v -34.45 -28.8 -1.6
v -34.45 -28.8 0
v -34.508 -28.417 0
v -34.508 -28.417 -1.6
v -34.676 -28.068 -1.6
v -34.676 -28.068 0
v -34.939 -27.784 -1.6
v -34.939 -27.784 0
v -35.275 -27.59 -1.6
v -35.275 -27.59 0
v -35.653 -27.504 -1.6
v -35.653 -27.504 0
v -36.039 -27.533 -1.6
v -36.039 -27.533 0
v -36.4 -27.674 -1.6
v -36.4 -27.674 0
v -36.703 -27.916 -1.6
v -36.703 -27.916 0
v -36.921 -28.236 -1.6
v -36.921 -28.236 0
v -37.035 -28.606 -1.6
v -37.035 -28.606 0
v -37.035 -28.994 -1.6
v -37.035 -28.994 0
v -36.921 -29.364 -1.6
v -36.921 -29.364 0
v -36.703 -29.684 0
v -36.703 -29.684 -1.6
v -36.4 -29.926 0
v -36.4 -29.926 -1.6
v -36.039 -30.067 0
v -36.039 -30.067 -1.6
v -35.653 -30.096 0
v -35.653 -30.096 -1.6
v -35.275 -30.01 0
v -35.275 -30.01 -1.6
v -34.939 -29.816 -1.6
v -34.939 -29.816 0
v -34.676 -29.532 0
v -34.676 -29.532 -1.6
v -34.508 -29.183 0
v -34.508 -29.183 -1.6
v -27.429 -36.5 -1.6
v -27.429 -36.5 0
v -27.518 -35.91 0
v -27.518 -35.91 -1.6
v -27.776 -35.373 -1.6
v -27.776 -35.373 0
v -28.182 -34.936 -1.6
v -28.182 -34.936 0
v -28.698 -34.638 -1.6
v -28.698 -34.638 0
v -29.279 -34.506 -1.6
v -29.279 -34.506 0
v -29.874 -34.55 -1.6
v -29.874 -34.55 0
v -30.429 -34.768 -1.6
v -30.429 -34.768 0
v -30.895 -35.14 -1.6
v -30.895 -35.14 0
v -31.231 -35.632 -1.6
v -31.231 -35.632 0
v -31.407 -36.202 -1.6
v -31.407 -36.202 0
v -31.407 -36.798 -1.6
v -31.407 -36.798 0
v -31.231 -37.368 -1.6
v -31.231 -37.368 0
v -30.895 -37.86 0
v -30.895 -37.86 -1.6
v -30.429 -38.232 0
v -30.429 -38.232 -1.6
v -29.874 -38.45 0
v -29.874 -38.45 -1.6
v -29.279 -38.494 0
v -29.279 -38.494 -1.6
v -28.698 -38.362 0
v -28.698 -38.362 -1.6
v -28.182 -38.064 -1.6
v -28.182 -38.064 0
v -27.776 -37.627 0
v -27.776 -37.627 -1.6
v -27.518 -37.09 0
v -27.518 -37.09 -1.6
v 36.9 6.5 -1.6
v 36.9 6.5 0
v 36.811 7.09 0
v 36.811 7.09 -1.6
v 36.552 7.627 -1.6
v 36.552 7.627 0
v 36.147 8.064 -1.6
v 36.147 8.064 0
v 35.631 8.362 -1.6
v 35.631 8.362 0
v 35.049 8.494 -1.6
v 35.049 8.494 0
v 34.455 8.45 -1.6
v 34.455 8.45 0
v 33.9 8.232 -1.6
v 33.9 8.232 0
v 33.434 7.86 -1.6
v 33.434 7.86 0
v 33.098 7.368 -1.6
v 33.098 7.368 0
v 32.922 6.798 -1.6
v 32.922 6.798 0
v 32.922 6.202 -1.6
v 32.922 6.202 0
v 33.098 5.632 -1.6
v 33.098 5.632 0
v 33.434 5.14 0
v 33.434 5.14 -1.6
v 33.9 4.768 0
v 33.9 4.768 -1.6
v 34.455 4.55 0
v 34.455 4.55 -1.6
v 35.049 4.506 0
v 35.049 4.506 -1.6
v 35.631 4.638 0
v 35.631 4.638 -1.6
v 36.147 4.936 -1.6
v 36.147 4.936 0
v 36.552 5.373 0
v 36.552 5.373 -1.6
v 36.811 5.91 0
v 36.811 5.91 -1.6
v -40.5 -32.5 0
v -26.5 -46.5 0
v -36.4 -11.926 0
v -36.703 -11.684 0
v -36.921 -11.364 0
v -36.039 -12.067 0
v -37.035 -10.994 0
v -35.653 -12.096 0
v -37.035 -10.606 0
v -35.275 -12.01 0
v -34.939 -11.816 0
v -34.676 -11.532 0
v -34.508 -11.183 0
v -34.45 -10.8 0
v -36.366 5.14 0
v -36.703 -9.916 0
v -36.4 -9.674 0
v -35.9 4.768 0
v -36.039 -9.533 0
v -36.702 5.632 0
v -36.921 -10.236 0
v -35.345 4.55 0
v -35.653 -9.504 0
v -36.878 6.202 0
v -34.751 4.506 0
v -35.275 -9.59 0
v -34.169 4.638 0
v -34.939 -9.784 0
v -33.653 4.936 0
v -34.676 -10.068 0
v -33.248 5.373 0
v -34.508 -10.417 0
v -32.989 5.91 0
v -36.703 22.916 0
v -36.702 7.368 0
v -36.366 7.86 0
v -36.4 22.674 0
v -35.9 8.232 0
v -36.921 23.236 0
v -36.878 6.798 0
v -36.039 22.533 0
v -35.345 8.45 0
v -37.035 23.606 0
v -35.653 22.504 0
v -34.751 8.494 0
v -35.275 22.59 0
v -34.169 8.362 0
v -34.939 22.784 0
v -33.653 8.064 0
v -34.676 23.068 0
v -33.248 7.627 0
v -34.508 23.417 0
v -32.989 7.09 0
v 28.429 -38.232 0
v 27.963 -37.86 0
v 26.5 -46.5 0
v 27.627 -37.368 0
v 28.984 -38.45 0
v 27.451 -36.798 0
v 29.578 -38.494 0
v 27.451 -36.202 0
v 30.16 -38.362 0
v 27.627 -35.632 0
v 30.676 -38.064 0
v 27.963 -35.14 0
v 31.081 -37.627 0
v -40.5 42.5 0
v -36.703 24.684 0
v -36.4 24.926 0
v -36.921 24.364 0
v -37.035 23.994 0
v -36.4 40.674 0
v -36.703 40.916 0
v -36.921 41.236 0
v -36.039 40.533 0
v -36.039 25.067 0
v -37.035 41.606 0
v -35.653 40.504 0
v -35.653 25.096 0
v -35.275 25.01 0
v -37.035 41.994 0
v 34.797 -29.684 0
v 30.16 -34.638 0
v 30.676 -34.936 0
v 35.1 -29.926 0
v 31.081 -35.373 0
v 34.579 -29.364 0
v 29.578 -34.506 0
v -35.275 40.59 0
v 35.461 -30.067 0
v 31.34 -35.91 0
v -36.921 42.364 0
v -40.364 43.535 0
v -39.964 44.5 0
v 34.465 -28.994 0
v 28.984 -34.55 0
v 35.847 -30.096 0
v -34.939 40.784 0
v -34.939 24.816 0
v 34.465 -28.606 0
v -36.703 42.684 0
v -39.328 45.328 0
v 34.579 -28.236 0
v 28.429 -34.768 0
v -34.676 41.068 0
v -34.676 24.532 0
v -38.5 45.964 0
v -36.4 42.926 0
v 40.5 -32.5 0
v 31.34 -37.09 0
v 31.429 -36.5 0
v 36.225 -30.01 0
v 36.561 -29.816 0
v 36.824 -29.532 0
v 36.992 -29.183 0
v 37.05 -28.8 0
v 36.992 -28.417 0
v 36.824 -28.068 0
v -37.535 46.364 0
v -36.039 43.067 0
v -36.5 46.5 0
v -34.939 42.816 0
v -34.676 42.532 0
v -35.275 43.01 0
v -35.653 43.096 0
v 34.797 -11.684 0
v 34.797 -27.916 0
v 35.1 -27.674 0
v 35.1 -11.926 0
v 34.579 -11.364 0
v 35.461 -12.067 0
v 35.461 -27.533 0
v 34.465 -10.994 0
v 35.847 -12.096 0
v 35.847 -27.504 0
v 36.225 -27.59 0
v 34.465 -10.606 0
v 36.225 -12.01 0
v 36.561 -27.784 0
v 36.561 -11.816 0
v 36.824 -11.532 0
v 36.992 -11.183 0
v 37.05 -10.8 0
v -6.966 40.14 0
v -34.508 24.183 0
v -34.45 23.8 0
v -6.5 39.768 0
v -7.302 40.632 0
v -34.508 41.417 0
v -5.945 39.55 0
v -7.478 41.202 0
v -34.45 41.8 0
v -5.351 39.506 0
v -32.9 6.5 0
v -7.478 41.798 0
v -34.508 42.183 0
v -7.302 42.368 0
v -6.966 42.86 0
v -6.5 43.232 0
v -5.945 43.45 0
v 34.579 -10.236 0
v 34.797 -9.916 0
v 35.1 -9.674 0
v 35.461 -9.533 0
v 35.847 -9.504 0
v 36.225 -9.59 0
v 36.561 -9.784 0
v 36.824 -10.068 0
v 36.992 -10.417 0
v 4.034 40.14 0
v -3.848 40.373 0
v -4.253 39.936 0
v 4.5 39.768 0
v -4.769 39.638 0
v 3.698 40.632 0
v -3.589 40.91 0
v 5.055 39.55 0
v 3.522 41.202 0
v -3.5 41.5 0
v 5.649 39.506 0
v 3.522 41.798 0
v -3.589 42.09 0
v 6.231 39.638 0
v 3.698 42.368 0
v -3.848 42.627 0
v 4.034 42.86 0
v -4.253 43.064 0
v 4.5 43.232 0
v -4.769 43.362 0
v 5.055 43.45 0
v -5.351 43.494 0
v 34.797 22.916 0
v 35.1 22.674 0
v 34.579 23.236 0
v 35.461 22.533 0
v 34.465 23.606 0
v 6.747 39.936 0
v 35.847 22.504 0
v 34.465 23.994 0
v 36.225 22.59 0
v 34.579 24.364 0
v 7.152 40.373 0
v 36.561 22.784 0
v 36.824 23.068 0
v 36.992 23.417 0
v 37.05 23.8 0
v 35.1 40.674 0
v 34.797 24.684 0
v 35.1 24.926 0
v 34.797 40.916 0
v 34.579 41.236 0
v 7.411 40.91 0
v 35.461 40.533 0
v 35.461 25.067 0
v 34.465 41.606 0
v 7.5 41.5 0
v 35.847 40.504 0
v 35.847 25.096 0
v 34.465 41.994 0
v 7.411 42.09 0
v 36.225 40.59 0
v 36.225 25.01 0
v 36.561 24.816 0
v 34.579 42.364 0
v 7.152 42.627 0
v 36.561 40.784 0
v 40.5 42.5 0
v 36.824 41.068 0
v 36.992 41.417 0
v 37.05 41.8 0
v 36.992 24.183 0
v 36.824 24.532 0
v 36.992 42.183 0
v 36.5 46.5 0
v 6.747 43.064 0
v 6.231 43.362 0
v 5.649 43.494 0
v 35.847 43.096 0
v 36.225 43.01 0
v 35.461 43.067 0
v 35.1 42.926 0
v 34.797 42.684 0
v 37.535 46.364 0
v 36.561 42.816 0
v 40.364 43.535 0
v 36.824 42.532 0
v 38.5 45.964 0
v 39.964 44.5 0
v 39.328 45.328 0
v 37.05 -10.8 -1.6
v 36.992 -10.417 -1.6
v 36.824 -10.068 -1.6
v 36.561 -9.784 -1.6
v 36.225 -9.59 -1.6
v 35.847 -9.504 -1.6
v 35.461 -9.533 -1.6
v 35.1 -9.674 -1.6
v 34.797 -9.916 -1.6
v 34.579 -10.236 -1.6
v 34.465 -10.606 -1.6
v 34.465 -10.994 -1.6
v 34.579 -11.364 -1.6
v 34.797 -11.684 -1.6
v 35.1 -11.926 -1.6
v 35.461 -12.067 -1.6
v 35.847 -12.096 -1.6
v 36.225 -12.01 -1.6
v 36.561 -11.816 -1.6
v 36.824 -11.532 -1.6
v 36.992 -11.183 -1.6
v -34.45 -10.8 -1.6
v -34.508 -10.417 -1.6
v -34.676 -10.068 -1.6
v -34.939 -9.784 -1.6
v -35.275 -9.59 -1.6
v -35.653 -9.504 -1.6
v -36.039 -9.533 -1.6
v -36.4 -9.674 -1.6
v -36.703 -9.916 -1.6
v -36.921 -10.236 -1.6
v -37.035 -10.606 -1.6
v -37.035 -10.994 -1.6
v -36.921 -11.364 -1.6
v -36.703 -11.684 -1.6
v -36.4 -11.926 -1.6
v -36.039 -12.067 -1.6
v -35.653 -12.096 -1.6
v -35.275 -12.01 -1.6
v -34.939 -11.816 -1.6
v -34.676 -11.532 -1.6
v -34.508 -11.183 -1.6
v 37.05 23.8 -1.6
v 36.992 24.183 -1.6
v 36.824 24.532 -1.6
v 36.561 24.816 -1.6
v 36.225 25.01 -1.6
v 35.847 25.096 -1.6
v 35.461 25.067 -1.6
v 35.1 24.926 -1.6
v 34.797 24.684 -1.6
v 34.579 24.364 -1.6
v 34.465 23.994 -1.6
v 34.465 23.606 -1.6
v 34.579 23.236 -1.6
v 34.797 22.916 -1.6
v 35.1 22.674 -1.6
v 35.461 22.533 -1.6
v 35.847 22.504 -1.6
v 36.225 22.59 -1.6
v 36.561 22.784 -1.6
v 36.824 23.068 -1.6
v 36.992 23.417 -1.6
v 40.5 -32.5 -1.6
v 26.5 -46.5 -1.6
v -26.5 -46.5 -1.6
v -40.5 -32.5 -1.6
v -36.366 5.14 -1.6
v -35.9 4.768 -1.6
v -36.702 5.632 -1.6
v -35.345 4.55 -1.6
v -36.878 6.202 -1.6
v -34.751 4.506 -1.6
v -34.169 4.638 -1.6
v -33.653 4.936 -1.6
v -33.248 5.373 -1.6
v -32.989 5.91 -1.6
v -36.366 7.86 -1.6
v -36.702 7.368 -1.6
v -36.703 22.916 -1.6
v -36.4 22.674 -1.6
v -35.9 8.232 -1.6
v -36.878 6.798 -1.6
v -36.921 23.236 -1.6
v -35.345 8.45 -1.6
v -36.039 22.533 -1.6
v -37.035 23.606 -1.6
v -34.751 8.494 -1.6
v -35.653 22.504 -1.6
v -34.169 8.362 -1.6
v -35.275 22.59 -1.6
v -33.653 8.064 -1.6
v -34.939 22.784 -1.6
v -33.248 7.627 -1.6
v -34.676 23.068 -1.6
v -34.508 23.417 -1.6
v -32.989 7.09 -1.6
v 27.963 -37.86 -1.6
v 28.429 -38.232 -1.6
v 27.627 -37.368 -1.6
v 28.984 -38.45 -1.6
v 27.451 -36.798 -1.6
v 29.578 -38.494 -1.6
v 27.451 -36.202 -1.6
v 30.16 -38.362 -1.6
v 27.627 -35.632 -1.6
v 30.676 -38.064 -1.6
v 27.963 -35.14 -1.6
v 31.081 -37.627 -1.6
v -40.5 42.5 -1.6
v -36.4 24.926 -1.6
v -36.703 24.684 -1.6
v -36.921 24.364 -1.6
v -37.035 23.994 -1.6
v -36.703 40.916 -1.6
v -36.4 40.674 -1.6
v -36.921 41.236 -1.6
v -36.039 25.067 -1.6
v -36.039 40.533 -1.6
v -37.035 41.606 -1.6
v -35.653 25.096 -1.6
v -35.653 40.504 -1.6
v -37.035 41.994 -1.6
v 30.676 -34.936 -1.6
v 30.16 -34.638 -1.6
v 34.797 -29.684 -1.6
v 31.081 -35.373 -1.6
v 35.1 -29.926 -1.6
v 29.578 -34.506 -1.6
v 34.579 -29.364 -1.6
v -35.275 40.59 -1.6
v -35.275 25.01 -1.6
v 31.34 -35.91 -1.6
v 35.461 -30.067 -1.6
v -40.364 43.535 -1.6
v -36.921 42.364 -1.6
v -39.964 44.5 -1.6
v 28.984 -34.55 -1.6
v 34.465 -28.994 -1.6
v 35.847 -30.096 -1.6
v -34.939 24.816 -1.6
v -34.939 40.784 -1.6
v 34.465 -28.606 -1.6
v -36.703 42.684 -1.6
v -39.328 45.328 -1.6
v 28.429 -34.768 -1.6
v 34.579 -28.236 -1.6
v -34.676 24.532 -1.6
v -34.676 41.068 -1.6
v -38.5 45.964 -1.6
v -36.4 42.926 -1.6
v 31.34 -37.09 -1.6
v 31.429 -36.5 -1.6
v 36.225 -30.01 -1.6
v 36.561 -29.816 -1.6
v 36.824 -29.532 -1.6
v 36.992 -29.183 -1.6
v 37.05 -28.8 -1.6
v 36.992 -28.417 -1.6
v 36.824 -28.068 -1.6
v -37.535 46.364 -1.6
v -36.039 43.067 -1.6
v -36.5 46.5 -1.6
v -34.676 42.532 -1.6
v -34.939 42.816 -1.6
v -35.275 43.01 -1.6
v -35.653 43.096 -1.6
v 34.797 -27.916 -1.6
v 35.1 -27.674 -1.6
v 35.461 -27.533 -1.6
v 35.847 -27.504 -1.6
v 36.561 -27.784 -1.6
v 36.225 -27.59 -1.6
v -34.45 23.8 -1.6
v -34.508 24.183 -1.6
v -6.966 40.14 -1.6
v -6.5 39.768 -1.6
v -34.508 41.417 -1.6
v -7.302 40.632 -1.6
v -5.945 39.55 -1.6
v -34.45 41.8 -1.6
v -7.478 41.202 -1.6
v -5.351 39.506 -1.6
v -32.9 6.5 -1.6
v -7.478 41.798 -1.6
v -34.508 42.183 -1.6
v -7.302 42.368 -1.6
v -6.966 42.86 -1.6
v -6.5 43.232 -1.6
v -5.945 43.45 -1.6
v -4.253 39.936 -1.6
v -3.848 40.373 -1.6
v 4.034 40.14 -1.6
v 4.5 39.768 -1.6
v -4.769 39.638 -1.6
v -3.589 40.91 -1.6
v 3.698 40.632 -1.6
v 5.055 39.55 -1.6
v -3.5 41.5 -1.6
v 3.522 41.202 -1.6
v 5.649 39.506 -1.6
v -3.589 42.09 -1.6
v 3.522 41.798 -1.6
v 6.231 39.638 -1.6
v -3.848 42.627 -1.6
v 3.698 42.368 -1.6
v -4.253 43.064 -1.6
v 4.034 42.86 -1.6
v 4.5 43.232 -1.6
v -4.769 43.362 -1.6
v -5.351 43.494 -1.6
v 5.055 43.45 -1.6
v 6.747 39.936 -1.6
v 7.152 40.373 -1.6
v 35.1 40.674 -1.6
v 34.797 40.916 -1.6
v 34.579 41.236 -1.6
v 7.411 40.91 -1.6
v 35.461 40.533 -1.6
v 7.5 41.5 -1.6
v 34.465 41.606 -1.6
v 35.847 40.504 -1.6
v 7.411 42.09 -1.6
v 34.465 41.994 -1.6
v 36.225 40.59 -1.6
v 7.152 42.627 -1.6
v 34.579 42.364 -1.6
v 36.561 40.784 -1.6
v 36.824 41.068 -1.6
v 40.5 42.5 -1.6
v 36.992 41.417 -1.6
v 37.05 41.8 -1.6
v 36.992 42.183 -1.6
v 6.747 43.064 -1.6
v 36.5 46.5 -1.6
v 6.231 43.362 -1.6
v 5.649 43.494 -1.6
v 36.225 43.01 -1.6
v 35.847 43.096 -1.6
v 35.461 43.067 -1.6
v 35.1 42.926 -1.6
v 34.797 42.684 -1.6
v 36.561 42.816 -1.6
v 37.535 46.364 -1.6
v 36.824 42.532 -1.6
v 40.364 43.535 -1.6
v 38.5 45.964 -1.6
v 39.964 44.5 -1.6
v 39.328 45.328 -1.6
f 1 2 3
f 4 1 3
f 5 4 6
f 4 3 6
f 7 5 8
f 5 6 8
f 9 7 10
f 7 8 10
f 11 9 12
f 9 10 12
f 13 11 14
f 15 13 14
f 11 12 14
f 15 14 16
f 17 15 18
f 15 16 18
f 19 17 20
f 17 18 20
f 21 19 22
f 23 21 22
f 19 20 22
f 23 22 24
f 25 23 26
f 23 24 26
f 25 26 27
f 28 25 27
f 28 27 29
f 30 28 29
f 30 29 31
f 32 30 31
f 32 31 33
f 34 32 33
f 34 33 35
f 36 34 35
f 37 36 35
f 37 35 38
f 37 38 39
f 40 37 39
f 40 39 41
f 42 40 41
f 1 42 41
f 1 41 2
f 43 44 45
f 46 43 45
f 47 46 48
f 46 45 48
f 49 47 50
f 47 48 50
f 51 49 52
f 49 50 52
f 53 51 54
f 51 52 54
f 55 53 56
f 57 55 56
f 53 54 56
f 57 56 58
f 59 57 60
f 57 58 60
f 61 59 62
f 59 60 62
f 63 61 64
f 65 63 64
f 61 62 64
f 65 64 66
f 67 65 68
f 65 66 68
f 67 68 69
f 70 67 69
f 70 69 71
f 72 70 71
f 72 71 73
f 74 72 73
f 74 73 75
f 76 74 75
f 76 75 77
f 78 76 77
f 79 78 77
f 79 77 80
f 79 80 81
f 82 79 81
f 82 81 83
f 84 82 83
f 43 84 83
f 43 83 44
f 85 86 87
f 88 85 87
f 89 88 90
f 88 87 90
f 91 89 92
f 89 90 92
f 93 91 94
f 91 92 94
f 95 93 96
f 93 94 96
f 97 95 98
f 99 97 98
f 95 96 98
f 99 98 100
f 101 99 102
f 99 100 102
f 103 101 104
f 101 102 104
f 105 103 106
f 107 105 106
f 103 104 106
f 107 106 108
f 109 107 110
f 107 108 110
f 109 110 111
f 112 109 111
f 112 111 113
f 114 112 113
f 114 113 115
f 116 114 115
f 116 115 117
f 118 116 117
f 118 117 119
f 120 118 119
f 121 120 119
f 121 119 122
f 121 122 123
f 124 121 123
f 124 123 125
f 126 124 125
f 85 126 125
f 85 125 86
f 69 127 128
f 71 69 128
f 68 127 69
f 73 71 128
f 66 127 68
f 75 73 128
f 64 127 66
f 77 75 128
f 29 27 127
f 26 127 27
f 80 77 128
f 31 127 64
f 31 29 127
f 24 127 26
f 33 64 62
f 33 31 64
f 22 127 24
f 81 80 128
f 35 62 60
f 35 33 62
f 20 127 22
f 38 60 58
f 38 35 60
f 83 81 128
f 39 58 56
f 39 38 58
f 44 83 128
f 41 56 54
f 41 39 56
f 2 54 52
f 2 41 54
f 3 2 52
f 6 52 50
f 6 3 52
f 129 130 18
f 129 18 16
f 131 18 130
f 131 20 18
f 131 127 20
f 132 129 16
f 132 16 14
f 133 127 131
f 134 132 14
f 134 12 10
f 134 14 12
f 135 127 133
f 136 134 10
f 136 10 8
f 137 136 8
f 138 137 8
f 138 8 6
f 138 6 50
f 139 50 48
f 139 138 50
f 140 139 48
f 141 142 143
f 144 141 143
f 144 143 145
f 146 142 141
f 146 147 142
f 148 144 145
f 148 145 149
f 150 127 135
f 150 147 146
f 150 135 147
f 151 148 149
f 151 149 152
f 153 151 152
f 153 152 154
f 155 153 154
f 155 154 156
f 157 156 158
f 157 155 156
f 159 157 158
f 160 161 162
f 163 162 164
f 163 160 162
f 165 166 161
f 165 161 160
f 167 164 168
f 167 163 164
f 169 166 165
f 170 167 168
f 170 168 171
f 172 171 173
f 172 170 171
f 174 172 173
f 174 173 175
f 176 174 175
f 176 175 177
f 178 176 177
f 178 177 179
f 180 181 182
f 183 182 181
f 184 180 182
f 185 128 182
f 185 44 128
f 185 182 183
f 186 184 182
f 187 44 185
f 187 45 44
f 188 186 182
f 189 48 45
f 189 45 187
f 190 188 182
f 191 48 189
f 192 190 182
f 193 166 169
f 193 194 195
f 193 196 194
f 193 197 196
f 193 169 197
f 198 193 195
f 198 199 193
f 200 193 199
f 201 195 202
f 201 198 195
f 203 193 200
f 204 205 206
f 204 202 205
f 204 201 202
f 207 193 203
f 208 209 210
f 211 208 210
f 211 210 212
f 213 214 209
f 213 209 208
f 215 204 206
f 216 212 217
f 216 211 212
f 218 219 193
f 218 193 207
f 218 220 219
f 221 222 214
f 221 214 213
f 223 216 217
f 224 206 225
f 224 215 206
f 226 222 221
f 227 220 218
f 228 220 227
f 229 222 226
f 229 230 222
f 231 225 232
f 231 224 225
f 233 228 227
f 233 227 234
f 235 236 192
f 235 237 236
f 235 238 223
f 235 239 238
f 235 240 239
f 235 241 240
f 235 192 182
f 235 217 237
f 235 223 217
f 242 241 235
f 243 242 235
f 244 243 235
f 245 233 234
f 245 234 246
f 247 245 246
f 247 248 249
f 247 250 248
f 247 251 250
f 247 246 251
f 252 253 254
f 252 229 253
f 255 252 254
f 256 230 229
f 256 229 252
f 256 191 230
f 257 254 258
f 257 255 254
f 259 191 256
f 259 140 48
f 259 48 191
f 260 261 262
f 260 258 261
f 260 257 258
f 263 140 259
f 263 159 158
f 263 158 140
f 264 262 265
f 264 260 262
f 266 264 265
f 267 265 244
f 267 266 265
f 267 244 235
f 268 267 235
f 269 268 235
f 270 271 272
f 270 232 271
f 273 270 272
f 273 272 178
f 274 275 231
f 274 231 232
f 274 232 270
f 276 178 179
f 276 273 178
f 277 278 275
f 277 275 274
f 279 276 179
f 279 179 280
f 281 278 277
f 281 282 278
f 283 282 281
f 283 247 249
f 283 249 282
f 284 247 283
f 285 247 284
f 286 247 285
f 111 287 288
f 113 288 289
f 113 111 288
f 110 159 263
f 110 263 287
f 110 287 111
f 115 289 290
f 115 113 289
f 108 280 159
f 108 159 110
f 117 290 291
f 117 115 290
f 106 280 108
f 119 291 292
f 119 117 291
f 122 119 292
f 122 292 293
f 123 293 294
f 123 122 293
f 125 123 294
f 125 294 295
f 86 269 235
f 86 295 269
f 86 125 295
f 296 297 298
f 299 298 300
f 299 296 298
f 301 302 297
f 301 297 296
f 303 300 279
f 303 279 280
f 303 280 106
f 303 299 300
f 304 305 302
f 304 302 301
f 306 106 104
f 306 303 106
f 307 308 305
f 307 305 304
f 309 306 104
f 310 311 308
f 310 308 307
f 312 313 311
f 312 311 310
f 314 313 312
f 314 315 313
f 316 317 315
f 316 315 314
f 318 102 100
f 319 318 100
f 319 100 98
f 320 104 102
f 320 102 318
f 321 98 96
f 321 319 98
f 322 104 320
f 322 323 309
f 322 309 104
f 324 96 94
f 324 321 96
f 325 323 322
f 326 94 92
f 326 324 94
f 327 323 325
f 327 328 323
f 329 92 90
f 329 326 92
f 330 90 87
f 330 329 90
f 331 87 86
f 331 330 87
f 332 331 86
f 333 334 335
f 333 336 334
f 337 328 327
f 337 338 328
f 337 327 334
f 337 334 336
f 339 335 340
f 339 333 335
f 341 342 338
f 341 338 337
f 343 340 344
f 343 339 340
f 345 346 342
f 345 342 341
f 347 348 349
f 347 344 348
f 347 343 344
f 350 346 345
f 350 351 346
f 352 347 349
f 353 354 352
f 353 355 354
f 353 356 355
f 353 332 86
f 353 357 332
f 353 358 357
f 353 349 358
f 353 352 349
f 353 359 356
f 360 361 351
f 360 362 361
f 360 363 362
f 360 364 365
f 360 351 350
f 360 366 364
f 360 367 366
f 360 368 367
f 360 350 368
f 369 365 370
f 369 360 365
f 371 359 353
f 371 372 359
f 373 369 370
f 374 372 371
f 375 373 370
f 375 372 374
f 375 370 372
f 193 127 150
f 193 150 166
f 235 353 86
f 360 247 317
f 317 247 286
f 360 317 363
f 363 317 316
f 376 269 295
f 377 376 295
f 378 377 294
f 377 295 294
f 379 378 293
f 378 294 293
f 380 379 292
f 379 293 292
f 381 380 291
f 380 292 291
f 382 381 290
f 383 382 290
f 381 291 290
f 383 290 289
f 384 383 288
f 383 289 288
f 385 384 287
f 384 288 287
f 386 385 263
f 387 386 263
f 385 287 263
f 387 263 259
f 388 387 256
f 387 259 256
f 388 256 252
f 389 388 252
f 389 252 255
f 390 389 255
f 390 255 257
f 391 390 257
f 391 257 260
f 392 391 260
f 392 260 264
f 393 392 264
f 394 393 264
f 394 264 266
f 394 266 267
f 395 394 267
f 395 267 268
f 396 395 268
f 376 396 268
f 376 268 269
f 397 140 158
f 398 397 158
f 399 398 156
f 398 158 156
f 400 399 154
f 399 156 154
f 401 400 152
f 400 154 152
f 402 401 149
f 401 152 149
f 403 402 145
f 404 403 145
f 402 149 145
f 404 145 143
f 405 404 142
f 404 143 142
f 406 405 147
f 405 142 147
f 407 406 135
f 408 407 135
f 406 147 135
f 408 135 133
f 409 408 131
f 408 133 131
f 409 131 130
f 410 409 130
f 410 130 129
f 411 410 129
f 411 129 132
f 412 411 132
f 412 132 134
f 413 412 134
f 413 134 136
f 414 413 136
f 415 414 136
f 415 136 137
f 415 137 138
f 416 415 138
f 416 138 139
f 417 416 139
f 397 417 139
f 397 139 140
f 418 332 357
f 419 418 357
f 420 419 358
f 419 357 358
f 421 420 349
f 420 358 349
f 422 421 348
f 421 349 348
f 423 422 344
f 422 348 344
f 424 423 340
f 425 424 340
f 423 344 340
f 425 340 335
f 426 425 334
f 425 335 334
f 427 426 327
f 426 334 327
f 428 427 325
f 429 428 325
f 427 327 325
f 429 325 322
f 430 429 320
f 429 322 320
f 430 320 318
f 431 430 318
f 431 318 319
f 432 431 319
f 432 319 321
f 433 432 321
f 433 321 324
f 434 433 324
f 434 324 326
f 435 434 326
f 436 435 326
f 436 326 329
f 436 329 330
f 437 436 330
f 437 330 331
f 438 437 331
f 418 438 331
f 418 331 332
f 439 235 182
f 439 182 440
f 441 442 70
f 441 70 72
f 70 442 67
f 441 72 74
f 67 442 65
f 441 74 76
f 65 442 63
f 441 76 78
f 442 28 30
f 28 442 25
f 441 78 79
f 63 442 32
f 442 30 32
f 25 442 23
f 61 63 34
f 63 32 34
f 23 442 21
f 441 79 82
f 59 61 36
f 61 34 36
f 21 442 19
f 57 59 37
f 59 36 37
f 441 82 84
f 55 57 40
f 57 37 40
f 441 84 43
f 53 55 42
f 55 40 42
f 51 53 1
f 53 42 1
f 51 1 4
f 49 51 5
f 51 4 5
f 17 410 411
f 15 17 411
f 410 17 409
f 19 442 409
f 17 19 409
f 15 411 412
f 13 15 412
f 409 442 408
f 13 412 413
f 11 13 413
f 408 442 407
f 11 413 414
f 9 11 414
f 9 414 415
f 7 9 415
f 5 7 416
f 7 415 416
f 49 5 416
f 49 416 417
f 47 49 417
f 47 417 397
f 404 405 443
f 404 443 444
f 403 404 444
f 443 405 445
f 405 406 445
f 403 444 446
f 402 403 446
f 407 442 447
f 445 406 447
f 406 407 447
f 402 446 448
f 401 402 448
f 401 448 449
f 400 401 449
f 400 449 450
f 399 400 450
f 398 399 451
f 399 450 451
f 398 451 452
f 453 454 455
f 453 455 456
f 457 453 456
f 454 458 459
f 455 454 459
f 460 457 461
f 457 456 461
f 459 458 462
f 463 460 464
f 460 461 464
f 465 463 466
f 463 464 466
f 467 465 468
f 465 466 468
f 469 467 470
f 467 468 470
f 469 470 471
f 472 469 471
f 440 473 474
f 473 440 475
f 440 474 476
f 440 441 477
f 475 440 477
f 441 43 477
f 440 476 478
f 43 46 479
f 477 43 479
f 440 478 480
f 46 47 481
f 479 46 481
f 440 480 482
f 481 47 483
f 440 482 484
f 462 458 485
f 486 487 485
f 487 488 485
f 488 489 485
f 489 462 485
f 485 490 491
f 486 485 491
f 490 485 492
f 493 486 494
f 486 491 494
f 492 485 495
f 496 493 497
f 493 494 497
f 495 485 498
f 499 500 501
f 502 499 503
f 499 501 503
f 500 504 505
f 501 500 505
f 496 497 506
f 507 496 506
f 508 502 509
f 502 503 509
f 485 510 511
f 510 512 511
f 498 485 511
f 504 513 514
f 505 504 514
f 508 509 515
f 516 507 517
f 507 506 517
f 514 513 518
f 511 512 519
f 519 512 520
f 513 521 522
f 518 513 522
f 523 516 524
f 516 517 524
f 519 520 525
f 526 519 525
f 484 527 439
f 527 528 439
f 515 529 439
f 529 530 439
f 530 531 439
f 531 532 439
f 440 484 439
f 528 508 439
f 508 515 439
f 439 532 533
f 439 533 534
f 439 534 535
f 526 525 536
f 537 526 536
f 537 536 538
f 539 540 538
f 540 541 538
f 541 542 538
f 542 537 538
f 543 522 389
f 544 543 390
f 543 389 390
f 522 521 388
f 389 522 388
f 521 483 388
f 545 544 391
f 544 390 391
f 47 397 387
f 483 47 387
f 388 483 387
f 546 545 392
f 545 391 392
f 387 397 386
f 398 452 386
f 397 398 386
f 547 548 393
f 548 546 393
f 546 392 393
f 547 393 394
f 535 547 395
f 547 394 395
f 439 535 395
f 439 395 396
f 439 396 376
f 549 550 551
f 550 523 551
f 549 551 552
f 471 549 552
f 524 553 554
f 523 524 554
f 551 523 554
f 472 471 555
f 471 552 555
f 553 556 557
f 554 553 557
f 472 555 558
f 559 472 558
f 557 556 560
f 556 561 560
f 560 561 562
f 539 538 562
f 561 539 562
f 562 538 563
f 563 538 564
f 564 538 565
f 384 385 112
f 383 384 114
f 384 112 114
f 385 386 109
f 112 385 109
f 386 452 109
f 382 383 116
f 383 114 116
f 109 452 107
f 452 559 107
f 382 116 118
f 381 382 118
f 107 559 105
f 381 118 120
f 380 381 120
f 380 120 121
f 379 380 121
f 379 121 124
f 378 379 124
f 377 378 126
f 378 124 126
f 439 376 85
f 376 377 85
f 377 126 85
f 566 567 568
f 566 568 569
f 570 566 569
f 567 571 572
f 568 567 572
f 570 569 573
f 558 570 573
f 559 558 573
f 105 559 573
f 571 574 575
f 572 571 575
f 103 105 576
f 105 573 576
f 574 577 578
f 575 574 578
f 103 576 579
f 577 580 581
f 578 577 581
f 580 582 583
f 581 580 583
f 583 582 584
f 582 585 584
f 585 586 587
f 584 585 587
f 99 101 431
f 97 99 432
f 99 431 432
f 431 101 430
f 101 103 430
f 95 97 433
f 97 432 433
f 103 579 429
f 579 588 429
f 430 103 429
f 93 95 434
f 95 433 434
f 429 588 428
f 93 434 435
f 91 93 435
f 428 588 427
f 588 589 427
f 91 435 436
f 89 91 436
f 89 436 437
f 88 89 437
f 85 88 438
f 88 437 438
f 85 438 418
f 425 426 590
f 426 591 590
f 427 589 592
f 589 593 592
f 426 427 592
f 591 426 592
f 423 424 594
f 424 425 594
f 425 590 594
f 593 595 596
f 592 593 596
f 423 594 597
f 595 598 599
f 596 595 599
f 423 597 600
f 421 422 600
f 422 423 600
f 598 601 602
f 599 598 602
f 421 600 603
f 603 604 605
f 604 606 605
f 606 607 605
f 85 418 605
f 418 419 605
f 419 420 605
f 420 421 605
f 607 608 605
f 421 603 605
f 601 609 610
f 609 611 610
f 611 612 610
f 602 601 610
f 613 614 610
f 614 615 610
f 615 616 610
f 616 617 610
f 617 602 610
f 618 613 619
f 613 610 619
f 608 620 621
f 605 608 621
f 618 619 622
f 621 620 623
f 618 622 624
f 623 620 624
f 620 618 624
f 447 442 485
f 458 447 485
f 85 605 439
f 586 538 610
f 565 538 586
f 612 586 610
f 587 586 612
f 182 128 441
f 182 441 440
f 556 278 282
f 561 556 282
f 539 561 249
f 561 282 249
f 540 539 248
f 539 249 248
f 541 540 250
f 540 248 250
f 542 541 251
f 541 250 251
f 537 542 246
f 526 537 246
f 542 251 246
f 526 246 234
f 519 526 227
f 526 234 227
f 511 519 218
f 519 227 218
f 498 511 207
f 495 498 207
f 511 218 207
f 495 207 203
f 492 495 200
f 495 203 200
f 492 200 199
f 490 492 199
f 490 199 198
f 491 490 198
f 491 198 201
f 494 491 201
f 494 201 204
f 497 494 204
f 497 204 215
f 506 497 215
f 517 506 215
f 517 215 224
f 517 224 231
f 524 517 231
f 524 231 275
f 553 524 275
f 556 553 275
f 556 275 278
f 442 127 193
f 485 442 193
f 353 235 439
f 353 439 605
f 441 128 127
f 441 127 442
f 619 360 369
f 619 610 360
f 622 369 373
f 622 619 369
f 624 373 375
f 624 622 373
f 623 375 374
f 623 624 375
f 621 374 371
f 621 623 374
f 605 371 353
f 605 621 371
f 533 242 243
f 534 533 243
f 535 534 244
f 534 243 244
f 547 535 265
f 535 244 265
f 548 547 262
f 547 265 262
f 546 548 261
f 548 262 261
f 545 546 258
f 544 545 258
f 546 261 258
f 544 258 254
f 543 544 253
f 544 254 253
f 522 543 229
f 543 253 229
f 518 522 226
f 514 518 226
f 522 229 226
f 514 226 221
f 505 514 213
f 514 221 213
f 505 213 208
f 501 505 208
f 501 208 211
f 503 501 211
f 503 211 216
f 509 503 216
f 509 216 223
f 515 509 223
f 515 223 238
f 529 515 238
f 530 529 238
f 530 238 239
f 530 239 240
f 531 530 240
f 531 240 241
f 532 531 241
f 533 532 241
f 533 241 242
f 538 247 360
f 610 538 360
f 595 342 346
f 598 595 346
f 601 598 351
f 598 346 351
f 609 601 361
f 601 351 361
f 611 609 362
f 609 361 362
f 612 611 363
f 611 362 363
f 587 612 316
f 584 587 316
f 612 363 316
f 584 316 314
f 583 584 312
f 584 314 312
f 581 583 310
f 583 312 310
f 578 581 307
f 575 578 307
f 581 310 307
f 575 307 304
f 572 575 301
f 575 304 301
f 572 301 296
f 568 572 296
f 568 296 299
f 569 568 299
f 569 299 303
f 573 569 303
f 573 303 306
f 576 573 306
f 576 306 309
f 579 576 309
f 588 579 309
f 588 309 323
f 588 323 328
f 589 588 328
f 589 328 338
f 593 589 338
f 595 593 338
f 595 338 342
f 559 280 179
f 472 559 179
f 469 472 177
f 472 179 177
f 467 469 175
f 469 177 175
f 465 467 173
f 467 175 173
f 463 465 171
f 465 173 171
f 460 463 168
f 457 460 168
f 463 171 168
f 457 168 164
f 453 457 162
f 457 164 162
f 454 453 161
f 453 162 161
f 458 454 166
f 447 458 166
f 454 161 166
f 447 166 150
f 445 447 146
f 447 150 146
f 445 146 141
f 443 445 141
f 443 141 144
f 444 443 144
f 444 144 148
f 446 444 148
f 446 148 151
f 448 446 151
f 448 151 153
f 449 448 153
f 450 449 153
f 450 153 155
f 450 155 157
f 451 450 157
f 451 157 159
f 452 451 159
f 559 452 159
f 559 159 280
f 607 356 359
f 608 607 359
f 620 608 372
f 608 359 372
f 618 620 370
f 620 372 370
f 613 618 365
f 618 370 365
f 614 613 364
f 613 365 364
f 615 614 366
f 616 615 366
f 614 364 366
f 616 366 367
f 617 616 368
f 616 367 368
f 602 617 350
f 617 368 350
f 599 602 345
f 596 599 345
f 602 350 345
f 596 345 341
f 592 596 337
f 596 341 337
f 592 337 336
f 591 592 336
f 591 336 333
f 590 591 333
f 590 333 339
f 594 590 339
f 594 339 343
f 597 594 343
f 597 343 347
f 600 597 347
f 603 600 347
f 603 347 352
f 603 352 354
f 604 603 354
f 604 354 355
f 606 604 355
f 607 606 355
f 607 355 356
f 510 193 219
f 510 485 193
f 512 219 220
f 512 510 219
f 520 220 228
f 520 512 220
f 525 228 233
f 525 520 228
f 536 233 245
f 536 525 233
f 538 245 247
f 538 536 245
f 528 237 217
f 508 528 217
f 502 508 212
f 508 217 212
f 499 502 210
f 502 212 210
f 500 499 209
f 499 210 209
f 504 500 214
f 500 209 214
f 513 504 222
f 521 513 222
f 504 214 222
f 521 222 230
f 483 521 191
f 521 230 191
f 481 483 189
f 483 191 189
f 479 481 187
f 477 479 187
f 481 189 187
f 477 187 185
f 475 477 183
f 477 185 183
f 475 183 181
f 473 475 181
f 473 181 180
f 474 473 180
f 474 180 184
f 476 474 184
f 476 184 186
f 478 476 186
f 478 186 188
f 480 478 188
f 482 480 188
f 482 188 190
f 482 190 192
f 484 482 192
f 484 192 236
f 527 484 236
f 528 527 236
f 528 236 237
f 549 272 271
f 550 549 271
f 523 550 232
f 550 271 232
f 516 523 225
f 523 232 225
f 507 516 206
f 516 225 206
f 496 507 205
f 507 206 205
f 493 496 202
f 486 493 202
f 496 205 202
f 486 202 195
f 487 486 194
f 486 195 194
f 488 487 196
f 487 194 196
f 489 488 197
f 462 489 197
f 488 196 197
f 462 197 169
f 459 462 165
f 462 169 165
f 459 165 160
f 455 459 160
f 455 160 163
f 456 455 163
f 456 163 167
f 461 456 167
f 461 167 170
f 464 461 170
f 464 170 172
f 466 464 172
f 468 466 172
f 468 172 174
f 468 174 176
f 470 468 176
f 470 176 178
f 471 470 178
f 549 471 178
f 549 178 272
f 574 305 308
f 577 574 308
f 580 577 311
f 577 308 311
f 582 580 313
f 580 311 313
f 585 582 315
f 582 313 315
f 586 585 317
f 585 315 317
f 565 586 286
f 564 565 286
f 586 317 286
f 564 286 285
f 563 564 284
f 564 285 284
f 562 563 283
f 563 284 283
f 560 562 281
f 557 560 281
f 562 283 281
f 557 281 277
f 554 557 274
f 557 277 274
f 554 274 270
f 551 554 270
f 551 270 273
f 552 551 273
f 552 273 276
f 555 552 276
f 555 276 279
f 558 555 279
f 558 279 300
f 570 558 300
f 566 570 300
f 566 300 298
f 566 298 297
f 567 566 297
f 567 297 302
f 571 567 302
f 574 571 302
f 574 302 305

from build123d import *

# Parameters (mm, degrees)
SKETCH001_W   = 81
SKETCH001_H   = 93
PAD_DEPTH     = 1.6
CHAMFER_SIZE  = 14
FILLET_R      = 4
SKETCH002_R   = 1.3
HOLE_DEPTH    = 1.601
SKETCH003_R   = 2
HOLE001_DEPTH = 1.601
SKETCH004_R   = 2
HOLE002_DEPTH = 1.601


with BuildPart() as part:
    # Sketch001 → Pad (new body)
    with BuildSketch(Plane.XY):
        Rectangle(SKETCH001_W, SKETCH001_H)
    extrude(amount=-PAD_DEPTH)

    # Chamfer
    chamfer_edges = [part.edges().sort_by_distance(p)[0] for p in [
        (-40.5, -46.5, -0.8),
        (40.5, -46.5, -0.8),
    ]]
    chamfer(chamfer_edges, length=CHAMFER_SIZE)

    # Fillet
    fillet_edges = [part.edges().sort_by_distance(p)[0] for p in [
        (-40.5, 46.5, -0.8),
        (40.5, 46.5, -0.8),
    ]]
    fillet(fillet_edges, radius=FILLET_R)

    # Sketch002 (on Face2 of Fillet) → Hole (cut, through all)
    with BuildSketch(Plane.XY):
        with Locations((-35.75, 41.8)):
            Circle(SKETCH002_R)
        with Locations((-35.75, 23.8)):
            Circle(SKETCH002_R)
        with Locations((35.75, 41.8)):
            Circle(SKETCH002_R)
        with Locations((35.75, 23.8)):
            Circle(SKETCH002_R)
        with Locations((-35.75, -10.8)):
            Circle(SKETCH002_R)
        with Locations((-35.75, -28.8)):
            Circle(SKETCH002_R)
        with Locations((35.75, -28.8)):
            Circle(SKETCH002_R)
        with Locations((35.75, -10.8)):
            Circle(SKETCH002_R)
    extrude(amount=-HOLE_DEPTH, mode=Mode.SUBTRACT)

    # Sketch003 (on Face2 of Hole) → Hole001 (cut, through all)
    with BuildSketch(Plane.XY):
        with Locations((-5.5, 41.5)):
            Circle(SKETCH003_R)
        with Locations((5.5, 41.5)):
            Circle(SKETCH003_R)
        with Locations((-29.428932, -36.5)):
            Circle(SKETCH003_R)
        with Locations((29.428932, -36.5)):
            Circle(SKETCH003_R)
    extrude(amount=-HOLE001_DEPTH, mode=Mode.SUBTRACT)

    # Sketch004 (on Face2 of Hole001) → Hole002 (cut, through all)
    with BuildSketch(Plane.XY):
        with Locations((-34.9, 6.5)):
            Circle(SKETCH004_R)
        with Locations((34.9, 6.5)):
            Circle(SKETCH004_R)
    extrude(amount=-HOLE002_DEPTH, mode=Mode.SUBTRACT)


solid = part.part
